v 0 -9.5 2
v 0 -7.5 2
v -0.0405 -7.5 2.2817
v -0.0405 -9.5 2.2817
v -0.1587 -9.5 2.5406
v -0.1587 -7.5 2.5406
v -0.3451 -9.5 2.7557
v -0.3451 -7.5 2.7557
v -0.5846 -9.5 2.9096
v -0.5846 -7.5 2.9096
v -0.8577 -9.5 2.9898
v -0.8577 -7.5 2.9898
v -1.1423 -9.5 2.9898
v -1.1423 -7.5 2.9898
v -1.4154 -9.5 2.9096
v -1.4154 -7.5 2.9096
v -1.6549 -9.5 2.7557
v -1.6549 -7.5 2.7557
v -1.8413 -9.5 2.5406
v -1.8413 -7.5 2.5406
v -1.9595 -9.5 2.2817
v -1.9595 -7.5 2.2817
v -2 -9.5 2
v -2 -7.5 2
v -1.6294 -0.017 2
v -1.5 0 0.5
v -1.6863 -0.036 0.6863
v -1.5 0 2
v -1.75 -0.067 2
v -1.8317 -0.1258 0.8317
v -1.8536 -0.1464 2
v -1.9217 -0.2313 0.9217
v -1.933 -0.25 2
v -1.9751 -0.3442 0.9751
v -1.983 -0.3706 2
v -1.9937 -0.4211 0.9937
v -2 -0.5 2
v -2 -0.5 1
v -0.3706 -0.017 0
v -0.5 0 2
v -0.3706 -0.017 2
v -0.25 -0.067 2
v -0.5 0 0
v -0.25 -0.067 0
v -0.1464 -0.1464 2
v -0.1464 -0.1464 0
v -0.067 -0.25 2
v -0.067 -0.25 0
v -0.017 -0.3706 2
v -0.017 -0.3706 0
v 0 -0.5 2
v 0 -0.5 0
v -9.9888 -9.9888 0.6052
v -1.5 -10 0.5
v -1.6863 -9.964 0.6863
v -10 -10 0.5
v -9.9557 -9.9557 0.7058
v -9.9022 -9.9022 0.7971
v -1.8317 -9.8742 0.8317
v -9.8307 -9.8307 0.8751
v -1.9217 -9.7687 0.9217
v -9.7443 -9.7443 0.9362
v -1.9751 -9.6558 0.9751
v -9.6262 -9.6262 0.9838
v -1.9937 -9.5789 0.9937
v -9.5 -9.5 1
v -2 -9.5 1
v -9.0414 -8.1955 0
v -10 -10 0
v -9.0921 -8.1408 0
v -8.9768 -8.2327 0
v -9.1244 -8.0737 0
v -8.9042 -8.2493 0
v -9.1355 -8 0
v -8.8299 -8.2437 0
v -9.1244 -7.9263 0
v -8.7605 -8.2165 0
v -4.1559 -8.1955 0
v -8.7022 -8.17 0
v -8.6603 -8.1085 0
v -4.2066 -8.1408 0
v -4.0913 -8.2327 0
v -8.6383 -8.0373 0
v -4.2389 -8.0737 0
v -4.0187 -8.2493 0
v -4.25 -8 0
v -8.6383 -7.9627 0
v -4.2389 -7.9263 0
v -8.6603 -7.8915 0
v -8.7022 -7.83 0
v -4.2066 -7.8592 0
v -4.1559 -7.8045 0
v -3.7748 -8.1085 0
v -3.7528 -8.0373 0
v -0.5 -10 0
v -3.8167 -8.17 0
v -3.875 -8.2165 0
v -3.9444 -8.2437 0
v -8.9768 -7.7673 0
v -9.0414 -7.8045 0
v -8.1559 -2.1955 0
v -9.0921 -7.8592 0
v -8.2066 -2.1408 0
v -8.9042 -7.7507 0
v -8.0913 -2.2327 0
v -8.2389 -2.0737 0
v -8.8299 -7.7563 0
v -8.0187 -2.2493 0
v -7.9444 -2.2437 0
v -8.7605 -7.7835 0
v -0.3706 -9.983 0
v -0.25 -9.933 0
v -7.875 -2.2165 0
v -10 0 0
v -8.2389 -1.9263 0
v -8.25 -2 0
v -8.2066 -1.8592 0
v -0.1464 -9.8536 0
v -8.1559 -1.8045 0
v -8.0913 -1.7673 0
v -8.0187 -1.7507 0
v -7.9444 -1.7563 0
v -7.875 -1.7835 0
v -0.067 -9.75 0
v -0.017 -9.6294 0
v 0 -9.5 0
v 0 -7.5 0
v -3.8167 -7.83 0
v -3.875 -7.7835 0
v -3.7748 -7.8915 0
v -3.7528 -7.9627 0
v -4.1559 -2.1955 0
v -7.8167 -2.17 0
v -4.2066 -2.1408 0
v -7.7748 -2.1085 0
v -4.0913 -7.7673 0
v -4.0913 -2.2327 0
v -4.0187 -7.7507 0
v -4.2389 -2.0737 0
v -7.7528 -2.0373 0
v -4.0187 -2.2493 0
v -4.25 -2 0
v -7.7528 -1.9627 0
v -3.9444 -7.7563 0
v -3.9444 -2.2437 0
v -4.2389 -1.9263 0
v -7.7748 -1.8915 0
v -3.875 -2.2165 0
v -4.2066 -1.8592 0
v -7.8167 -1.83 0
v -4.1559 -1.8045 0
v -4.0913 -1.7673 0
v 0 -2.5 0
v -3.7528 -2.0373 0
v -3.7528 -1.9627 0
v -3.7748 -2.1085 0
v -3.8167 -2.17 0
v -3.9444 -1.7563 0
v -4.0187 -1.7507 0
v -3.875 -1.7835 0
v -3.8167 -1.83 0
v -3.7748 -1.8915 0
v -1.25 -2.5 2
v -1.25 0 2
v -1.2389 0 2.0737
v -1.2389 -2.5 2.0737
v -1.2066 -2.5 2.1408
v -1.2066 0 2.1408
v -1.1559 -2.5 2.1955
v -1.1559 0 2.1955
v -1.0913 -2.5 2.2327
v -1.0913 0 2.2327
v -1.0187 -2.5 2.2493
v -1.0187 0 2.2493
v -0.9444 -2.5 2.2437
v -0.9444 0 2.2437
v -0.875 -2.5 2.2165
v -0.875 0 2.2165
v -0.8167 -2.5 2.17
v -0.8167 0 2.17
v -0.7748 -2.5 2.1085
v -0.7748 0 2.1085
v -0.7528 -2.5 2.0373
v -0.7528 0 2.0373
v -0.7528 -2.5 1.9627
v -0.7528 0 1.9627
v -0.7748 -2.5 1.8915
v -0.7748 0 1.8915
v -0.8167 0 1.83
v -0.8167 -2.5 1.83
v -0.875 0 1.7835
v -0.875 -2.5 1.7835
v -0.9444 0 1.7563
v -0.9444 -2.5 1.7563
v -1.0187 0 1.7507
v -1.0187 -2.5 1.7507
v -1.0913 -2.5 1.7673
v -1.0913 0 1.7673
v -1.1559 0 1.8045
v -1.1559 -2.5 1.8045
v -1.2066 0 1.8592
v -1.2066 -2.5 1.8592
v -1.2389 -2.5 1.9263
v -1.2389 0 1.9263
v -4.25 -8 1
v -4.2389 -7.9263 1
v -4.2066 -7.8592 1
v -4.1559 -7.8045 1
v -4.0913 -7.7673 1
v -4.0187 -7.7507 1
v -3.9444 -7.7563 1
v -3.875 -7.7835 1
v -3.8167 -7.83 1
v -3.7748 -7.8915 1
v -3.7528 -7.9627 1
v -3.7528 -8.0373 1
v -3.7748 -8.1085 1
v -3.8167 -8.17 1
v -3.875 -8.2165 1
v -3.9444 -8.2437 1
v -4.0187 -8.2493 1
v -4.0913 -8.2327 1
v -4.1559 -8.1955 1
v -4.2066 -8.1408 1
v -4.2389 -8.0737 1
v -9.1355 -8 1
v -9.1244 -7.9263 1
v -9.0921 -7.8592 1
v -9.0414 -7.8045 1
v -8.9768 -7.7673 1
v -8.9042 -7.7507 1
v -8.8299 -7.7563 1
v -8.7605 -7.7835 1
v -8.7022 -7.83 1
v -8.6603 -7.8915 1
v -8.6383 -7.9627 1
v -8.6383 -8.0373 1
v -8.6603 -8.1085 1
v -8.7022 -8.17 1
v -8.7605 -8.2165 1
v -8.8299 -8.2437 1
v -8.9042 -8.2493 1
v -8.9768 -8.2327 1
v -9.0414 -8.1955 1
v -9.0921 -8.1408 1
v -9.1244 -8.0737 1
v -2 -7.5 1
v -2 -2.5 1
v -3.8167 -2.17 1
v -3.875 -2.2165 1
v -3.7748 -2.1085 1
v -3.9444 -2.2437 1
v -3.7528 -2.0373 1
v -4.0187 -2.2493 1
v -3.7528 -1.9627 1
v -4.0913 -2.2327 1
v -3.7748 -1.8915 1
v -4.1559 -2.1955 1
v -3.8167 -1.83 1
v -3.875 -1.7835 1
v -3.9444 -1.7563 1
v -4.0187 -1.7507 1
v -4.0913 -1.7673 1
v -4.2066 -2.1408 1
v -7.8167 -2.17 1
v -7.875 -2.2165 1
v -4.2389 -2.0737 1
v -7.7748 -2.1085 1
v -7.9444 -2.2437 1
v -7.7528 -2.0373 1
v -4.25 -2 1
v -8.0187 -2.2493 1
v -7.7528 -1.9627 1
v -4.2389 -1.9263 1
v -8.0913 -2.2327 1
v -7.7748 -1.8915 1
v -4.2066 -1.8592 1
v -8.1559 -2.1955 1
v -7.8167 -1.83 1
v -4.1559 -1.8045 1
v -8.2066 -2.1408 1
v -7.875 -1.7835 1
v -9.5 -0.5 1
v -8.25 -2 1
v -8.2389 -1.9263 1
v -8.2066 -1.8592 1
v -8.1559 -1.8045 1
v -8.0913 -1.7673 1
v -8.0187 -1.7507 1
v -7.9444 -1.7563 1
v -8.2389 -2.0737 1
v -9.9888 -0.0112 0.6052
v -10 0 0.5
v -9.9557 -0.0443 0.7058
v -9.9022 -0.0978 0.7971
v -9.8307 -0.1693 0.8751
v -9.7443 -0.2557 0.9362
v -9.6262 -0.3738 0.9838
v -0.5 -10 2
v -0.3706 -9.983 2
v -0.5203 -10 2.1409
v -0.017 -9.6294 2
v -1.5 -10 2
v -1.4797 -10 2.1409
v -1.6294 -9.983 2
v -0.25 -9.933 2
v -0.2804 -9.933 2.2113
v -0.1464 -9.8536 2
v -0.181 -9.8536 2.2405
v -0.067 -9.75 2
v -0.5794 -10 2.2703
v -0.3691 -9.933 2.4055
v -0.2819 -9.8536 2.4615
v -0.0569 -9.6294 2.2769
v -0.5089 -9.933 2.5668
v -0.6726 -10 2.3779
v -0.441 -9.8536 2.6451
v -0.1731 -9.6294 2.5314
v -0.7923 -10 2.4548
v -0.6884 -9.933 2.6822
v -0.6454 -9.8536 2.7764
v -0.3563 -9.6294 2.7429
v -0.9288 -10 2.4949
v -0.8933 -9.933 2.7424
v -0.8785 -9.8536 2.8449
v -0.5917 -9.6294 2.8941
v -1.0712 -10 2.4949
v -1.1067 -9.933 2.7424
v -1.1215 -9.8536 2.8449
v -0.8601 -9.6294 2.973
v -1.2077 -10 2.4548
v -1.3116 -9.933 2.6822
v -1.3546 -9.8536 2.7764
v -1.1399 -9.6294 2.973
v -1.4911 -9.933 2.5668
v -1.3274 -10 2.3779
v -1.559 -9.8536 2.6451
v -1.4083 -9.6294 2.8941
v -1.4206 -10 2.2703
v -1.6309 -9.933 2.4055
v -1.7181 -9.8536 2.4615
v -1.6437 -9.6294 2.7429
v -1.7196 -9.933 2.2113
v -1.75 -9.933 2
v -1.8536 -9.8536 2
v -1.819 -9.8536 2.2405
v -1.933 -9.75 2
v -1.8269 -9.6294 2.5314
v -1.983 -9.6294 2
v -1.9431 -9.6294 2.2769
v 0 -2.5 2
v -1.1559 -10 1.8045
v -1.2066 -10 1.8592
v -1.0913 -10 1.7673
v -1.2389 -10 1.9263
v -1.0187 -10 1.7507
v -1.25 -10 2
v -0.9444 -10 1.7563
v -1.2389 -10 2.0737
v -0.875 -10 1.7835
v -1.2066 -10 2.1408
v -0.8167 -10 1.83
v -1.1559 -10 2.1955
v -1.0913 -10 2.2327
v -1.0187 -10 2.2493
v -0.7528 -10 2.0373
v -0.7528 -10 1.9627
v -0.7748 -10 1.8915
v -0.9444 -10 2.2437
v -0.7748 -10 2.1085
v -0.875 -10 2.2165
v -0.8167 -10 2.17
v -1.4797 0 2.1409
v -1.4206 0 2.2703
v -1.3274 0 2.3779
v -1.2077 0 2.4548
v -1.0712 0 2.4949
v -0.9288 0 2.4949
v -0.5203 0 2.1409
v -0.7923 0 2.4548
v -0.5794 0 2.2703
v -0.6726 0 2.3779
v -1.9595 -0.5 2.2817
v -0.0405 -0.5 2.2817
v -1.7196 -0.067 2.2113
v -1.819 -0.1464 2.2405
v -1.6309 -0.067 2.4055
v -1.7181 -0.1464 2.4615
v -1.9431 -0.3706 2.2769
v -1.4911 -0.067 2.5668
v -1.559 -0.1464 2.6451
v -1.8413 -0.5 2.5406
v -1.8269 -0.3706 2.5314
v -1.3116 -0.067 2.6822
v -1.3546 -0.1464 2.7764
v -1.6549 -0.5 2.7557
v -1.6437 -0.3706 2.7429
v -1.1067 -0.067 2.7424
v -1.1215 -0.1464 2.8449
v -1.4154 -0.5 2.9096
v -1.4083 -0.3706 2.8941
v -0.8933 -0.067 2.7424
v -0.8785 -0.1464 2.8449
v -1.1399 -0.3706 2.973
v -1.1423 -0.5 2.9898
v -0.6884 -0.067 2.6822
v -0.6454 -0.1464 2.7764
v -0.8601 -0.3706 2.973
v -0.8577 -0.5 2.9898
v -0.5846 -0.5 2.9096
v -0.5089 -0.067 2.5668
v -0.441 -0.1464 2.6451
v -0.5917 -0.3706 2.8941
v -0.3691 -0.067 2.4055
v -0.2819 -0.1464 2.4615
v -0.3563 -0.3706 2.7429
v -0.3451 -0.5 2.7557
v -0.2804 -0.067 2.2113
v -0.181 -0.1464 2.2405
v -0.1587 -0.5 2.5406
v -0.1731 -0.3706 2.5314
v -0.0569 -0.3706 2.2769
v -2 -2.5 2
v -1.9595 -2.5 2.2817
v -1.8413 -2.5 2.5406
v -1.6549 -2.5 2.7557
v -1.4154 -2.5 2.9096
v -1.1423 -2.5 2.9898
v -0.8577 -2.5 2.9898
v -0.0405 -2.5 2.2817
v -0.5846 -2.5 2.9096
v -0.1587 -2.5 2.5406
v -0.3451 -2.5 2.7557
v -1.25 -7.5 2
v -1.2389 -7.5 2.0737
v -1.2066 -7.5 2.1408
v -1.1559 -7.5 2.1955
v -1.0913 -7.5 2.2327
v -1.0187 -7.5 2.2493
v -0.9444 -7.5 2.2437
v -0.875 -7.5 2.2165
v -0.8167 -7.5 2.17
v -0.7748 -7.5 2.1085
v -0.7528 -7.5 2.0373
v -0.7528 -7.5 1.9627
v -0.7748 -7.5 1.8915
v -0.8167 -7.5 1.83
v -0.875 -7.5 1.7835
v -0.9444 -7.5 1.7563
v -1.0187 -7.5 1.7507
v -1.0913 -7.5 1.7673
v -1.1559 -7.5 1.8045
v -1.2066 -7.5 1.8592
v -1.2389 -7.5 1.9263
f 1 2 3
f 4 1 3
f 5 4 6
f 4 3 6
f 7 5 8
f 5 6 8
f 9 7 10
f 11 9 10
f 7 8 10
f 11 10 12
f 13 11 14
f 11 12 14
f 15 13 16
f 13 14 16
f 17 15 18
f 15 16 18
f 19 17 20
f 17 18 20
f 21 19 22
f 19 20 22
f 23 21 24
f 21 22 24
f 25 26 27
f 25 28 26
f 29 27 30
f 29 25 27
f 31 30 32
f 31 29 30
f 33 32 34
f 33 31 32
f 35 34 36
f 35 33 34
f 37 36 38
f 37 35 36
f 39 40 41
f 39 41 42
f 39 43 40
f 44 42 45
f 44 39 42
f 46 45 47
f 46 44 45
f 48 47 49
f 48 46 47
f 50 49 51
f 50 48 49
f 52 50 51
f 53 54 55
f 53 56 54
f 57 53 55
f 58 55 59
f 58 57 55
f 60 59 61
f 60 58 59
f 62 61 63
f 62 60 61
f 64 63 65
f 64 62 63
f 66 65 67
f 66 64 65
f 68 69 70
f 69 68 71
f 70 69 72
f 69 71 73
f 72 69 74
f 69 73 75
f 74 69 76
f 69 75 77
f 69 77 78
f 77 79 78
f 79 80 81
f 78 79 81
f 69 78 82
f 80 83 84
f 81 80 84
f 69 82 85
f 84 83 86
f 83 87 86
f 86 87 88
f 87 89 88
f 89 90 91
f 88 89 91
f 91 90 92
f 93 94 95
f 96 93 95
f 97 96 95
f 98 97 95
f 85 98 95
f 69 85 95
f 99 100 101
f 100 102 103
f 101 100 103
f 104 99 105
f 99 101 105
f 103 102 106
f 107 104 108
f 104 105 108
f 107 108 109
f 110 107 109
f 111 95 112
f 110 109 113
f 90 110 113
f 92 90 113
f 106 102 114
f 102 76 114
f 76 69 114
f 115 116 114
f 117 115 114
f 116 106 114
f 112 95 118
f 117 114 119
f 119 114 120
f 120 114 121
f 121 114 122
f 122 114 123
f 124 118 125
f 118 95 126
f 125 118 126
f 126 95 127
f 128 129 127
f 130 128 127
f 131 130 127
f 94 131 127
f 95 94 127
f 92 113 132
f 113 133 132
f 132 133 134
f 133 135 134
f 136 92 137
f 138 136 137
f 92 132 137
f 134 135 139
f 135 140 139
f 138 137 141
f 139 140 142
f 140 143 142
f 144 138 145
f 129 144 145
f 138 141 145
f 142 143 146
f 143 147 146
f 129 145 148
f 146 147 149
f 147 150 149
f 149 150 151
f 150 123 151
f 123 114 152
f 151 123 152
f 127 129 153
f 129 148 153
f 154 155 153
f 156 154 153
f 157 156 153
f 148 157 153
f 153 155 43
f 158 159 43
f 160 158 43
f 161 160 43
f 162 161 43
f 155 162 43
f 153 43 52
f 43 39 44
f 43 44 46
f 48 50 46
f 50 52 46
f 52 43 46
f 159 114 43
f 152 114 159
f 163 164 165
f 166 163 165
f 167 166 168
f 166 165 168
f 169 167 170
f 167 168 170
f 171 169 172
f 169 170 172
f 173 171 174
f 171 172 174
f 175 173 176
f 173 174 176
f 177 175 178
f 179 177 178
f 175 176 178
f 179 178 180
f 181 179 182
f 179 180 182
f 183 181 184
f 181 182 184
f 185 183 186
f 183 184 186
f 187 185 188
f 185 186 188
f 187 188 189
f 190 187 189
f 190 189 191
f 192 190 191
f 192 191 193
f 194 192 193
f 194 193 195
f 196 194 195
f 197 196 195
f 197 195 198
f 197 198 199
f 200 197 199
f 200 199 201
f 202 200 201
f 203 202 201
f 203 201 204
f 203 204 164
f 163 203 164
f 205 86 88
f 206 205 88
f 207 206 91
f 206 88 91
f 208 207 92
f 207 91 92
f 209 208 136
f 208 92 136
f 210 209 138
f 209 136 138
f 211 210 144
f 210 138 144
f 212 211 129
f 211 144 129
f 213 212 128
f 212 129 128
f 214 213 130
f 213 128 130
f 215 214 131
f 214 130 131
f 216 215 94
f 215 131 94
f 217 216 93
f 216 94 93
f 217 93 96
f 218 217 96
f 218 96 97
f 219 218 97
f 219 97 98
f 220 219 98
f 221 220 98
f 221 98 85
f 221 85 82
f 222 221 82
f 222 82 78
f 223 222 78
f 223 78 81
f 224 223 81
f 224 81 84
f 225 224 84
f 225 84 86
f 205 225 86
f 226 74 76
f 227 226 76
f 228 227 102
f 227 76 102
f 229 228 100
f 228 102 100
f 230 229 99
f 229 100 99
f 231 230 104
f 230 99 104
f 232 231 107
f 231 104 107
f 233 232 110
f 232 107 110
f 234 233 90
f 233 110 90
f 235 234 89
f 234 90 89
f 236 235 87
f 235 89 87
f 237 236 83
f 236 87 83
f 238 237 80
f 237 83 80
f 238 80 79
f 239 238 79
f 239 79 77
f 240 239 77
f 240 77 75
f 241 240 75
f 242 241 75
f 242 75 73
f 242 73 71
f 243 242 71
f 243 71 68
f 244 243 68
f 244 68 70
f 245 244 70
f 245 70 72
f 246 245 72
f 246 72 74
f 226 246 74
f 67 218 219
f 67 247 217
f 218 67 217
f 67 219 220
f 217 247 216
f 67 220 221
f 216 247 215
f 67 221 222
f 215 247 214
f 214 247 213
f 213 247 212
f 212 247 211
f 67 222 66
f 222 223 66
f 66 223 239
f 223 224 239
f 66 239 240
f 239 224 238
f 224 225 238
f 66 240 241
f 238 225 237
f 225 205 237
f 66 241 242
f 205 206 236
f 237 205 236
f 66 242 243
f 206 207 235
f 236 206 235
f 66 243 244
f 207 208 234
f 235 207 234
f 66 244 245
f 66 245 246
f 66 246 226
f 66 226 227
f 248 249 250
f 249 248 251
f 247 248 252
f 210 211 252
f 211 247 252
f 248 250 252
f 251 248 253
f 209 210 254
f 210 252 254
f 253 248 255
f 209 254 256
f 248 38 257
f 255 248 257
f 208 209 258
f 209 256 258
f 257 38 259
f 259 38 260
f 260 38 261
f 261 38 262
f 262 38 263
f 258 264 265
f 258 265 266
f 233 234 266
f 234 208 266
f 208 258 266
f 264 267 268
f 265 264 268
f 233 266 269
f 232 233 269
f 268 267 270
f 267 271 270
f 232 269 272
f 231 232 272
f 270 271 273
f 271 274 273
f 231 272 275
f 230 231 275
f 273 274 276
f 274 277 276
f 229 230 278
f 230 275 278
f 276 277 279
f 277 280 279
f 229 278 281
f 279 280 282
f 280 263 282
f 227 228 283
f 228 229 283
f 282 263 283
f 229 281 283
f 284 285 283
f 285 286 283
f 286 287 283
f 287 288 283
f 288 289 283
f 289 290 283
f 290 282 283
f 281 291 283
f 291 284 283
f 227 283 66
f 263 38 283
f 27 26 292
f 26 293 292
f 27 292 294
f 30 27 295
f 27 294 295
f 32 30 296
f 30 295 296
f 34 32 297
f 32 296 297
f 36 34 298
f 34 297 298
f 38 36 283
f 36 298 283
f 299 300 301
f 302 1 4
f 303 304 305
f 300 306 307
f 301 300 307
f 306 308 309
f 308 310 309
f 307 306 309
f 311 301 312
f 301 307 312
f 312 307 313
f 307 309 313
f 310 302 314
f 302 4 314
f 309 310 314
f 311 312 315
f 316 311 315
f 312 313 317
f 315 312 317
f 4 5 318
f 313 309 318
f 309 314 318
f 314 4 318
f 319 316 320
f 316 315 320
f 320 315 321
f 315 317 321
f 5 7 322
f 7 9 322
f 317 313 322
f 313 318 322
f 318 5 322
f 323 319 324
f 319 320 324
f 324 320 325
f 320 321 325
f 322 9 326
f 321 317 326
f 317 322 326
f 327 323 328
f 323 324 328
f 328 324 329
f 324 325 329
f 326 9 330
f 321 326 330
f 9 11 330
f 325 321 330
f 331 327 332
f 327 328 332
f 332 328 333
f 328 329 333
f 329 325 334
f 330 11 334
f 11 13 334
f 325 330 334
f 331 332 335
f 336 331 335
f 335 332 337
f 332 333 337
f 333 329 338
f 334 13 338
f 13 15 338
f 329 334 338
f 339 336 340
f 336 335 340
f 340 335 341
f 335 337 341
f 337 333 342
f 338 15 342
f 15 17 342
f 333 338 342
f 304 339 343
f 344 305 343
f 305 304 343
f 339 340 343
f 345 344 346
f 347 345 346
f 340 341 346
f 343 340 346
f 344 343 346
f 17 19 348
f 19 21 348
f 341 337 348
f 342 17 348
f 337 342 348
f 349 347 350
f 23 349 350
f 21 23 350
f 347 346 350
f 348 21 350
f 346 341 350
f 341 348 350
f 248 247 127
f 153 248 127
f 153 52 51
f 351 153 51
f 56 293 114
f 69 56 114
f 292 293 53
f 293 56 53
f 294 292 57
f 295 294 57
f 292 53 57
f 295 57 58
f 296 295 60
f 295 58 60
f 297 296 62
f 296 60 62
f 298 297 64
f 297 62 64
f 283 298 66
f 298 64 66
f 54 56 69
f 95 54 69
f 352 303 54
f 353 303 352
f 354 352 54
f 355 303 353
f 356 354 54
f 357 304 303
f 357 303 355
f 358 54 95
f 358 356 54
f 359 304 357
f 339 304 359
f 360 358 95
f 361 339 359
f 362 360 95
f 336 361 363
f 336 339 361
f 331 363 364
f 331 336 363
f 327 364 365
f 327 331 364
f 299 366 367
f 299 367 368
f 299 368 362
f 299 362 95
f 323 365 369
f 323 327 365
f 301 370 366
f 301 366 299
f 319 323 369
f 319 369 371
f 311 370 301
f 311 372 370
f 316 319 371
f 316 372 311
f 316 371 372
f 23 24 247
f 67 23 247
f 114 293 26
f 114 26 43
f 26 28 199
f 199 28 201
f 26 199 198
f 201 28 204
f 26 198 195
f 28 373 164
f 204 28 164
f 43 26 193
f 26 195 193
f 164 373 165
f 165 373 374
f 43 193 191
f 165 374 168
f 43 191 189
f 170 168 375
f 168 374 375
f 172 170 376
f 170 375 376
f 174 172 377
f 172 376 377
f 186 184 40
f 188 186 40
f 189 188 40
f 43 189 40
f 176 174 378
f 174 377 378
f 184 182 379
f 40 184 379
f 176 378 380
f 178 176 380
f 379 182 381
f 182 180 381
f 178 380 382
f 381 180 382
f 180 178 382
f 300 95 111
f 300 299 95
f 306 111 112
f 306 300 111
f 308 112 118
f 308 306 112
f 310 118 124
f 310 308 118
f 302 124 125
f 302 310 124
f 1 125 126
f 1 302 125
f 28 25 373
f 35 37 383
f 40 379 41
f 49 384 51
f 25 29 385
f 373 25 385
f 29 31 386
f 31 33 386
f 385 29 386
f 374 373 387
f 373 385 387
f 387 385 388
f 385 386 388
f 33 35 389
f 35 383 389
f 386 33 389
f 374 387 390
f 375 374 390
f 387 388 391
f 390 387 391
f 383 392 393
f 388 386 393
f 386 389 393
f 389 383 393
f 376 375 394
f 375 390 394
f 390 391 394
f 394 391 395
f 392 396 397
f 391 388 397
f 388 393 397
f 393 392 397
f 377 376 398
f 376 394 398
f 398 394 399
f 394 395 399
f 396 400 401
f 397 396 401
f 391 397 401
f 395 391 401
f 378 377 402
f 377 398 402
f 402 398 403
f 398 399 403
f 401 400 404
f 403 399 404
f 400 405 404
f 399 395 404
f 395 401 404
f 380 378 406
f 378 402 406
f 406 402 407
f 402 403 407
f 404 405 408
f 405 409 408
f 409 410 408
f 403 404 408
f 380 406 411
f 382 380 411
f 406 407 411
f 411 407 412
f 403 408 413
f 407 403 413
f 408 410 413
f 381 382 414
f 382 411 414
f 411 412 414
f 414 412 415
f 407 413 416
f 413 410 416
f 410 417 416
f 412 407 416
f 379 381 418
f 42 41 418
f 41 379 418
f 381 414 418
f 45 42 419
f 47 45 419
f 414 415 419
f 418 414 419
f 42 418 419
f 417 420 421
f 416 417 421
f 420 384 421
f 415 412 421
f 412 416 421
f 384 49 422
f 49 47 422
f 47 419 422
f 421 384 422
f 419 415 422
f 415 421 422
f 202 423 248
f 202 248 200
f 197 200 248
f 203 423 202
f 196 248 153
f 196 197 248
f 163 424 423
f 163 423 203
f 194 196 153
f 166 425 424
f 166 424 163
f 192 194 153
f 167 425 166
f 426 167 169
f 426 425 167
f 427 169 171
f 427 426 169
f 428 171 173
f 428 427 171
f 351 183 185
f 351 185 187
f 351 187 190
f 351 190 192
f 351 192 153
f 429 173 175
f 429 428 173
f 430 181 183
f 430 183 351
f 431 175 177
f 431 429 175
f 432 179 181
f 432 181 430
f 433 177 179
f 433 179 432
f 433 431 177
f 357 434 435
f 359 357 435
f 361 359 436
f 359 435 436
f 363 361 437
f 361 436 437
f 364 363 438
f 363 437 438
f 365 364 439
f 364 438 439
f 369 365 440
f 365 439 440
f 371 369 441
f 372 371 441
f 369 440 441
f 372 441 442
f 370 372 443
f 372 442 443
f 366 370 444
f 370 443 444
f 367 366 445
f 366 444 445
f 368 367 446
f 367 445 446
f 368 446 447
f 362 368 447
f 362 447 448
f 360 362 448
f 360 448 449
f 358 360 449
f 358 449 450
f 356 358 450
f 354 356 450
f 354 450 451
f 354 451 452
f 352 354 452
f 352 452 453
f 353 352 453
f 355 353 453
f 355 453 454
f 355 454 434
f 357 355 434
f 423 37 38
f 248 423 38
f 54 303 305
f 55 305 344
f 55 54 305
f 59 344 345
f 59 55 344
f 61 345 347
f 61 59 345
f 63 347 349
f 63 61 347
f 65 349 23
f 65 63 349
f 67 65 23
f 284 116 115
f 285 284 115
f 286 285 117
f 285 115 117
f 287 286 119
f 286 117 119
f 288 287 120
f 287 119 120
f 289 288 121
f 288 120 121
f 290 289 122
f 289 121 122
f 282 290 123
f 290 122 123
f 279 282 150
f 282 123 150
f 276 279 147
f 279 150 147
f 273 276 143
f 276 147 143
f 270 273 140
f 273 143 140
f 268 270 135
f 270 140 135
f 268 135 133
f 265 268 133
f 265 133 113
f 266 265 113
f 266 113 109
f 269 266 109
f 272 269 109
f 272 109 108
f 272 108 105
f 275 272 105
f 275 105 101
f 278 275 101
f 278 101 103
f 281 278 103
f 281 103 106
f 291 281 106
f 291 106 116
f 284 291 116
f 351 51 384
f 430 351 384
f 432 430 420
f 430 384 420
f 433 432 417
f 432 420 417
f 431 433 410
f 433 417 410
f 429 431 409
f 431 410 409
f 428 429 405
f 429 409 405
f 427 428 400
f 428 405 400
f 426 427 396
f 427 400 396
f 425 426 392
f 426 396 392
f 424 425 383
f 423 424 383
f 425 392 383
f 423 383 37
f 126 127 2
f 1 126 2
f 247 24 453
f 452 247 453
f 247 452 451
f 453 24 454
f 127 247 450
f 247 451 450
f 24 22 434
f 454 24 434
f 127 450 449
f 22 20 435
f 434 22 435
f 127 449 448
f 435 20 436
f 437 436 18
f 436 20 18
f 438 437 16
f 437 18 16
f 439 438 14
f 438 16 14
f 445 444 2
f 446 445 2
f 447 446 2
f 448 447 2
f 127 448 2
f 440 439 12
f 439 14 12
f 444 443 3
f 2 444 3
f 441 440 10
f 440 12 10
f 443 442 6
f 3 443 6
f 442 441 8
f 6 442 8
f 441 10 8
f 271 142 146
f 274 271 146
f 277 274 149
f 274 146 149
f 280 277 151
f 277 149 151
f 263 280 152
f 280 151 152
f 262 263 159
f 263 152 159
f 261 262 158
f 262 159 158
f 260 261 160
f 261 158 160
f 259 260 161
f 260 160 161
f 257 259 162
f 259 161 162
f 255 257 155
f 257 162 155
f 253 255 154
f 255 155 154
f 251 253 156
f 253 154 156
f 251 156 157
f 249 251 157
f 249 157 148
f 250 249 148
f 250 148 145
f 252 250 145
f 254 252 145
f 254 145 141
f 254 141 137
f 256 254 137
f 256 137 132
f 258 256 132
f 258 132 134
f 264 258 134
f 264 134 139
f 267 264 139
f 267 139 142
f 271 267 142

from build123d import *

# Parameters (mm, degrees)
F1_DEPTH = 10
F3_D     = 0.5
F5_D     = 0.5
F8_DEPTH = 5
F9_R     = 0.5
F10_R    = 0.5
F11_R    = 0.5


with BuildPart() as f1:
    # F0 (on Front) → F1 (new body)
    with BuildSketch(Plane.XZ):
        Polygon((-10, 0), (0, 0), (0, 1), (-1, 1), (-2, 1), (-10, 1), align=None)
        with BuildLine():
            Line((-1, 1), (0, 1))
            Line((0, 1), (0, 2))
            ThreePointArc((0, 2), (-0.2928932188, 1.2928932188), (-1, 1))
        make_face()
        with BuildLine():
            Line((-2, 1), (-1, 1))
            ThreePointArc((-1, 1), (-1.7071067812, 1.2928932188), (-2, 2))
            Line((-2, 2), (-2, 1))
        make_face()
        with BuildLine():
            ThreePointArc((-2, 2), (-1.7071067812, 1.2928932188), (-1, 1))
            ThreePointArc((-1, 1), (-0.2928932188, 1.2928932188), (0, 2))
            ThreePointArc((0, 2), (-1, 3), (-2, 2))
        make_face()
    extrude(amount=F1_DEPTH)

    # F3 (through all)
    with Locations(Plane.XY.offset(1)):
        with Locations((-8, -2), (-8.8854947245, -8), (-4, -8), (-4, -2)):
            Hole(F3_D / 2)

    # F5 (through all)
    with Locations(Plane.XZ.offset(10)):
        with Locations((-1, 2)):
            Hole(F5_D / 2)

    # F7 (on offset) → F8 (cut)
    with BuildSketch(Plane.XZ.offset(7.5)):
        with BuildLine():
            ThreePointArc((-2, 2), (-1, 1), (0, 2))
            ThreePointArc((0, 2), (-1, 3), (-2, 2))
        make_face()
        with BuildLine():
            Line((0, 0), (0, 2))
            ThreePointArc((0, 2), (-1, 1), (-2, 2))
            Line((-2, 2), (-2, 1))
            Line((-2, 1), (0, 0))
        make_face()
    extrude(amount=-F8_DEPTH, mode=Mode.SUBTRACT)

    # F9
    f9_edges = [f1.edges().sort_by_distance(p)[0] for p in [
        (-10, -5, 1),
        (-6, -10, 1),
        (-6, 0, 1),
    ]]
    fillet(f9_edges, radius=F9_R)

    # F10
    f10_edges = [f1.edges().sort_by_distance(p)[0] for p in [
        (0, -10, 1),
        (-1, -10, 3),
        (-2, -10, 1.5),
    ]]
    fillet(f10_edges, radius=F10_R)

    # F11
    f11_edges = [f1.edges().sort_by_distance(p)[0] for p in [
        (-2, 0, 1.5),
        (0, 0, 1),
        (-1, 0, 3),
    ]]
    fillet(f11_edges, radius=F11_R)


solid = f1.part
